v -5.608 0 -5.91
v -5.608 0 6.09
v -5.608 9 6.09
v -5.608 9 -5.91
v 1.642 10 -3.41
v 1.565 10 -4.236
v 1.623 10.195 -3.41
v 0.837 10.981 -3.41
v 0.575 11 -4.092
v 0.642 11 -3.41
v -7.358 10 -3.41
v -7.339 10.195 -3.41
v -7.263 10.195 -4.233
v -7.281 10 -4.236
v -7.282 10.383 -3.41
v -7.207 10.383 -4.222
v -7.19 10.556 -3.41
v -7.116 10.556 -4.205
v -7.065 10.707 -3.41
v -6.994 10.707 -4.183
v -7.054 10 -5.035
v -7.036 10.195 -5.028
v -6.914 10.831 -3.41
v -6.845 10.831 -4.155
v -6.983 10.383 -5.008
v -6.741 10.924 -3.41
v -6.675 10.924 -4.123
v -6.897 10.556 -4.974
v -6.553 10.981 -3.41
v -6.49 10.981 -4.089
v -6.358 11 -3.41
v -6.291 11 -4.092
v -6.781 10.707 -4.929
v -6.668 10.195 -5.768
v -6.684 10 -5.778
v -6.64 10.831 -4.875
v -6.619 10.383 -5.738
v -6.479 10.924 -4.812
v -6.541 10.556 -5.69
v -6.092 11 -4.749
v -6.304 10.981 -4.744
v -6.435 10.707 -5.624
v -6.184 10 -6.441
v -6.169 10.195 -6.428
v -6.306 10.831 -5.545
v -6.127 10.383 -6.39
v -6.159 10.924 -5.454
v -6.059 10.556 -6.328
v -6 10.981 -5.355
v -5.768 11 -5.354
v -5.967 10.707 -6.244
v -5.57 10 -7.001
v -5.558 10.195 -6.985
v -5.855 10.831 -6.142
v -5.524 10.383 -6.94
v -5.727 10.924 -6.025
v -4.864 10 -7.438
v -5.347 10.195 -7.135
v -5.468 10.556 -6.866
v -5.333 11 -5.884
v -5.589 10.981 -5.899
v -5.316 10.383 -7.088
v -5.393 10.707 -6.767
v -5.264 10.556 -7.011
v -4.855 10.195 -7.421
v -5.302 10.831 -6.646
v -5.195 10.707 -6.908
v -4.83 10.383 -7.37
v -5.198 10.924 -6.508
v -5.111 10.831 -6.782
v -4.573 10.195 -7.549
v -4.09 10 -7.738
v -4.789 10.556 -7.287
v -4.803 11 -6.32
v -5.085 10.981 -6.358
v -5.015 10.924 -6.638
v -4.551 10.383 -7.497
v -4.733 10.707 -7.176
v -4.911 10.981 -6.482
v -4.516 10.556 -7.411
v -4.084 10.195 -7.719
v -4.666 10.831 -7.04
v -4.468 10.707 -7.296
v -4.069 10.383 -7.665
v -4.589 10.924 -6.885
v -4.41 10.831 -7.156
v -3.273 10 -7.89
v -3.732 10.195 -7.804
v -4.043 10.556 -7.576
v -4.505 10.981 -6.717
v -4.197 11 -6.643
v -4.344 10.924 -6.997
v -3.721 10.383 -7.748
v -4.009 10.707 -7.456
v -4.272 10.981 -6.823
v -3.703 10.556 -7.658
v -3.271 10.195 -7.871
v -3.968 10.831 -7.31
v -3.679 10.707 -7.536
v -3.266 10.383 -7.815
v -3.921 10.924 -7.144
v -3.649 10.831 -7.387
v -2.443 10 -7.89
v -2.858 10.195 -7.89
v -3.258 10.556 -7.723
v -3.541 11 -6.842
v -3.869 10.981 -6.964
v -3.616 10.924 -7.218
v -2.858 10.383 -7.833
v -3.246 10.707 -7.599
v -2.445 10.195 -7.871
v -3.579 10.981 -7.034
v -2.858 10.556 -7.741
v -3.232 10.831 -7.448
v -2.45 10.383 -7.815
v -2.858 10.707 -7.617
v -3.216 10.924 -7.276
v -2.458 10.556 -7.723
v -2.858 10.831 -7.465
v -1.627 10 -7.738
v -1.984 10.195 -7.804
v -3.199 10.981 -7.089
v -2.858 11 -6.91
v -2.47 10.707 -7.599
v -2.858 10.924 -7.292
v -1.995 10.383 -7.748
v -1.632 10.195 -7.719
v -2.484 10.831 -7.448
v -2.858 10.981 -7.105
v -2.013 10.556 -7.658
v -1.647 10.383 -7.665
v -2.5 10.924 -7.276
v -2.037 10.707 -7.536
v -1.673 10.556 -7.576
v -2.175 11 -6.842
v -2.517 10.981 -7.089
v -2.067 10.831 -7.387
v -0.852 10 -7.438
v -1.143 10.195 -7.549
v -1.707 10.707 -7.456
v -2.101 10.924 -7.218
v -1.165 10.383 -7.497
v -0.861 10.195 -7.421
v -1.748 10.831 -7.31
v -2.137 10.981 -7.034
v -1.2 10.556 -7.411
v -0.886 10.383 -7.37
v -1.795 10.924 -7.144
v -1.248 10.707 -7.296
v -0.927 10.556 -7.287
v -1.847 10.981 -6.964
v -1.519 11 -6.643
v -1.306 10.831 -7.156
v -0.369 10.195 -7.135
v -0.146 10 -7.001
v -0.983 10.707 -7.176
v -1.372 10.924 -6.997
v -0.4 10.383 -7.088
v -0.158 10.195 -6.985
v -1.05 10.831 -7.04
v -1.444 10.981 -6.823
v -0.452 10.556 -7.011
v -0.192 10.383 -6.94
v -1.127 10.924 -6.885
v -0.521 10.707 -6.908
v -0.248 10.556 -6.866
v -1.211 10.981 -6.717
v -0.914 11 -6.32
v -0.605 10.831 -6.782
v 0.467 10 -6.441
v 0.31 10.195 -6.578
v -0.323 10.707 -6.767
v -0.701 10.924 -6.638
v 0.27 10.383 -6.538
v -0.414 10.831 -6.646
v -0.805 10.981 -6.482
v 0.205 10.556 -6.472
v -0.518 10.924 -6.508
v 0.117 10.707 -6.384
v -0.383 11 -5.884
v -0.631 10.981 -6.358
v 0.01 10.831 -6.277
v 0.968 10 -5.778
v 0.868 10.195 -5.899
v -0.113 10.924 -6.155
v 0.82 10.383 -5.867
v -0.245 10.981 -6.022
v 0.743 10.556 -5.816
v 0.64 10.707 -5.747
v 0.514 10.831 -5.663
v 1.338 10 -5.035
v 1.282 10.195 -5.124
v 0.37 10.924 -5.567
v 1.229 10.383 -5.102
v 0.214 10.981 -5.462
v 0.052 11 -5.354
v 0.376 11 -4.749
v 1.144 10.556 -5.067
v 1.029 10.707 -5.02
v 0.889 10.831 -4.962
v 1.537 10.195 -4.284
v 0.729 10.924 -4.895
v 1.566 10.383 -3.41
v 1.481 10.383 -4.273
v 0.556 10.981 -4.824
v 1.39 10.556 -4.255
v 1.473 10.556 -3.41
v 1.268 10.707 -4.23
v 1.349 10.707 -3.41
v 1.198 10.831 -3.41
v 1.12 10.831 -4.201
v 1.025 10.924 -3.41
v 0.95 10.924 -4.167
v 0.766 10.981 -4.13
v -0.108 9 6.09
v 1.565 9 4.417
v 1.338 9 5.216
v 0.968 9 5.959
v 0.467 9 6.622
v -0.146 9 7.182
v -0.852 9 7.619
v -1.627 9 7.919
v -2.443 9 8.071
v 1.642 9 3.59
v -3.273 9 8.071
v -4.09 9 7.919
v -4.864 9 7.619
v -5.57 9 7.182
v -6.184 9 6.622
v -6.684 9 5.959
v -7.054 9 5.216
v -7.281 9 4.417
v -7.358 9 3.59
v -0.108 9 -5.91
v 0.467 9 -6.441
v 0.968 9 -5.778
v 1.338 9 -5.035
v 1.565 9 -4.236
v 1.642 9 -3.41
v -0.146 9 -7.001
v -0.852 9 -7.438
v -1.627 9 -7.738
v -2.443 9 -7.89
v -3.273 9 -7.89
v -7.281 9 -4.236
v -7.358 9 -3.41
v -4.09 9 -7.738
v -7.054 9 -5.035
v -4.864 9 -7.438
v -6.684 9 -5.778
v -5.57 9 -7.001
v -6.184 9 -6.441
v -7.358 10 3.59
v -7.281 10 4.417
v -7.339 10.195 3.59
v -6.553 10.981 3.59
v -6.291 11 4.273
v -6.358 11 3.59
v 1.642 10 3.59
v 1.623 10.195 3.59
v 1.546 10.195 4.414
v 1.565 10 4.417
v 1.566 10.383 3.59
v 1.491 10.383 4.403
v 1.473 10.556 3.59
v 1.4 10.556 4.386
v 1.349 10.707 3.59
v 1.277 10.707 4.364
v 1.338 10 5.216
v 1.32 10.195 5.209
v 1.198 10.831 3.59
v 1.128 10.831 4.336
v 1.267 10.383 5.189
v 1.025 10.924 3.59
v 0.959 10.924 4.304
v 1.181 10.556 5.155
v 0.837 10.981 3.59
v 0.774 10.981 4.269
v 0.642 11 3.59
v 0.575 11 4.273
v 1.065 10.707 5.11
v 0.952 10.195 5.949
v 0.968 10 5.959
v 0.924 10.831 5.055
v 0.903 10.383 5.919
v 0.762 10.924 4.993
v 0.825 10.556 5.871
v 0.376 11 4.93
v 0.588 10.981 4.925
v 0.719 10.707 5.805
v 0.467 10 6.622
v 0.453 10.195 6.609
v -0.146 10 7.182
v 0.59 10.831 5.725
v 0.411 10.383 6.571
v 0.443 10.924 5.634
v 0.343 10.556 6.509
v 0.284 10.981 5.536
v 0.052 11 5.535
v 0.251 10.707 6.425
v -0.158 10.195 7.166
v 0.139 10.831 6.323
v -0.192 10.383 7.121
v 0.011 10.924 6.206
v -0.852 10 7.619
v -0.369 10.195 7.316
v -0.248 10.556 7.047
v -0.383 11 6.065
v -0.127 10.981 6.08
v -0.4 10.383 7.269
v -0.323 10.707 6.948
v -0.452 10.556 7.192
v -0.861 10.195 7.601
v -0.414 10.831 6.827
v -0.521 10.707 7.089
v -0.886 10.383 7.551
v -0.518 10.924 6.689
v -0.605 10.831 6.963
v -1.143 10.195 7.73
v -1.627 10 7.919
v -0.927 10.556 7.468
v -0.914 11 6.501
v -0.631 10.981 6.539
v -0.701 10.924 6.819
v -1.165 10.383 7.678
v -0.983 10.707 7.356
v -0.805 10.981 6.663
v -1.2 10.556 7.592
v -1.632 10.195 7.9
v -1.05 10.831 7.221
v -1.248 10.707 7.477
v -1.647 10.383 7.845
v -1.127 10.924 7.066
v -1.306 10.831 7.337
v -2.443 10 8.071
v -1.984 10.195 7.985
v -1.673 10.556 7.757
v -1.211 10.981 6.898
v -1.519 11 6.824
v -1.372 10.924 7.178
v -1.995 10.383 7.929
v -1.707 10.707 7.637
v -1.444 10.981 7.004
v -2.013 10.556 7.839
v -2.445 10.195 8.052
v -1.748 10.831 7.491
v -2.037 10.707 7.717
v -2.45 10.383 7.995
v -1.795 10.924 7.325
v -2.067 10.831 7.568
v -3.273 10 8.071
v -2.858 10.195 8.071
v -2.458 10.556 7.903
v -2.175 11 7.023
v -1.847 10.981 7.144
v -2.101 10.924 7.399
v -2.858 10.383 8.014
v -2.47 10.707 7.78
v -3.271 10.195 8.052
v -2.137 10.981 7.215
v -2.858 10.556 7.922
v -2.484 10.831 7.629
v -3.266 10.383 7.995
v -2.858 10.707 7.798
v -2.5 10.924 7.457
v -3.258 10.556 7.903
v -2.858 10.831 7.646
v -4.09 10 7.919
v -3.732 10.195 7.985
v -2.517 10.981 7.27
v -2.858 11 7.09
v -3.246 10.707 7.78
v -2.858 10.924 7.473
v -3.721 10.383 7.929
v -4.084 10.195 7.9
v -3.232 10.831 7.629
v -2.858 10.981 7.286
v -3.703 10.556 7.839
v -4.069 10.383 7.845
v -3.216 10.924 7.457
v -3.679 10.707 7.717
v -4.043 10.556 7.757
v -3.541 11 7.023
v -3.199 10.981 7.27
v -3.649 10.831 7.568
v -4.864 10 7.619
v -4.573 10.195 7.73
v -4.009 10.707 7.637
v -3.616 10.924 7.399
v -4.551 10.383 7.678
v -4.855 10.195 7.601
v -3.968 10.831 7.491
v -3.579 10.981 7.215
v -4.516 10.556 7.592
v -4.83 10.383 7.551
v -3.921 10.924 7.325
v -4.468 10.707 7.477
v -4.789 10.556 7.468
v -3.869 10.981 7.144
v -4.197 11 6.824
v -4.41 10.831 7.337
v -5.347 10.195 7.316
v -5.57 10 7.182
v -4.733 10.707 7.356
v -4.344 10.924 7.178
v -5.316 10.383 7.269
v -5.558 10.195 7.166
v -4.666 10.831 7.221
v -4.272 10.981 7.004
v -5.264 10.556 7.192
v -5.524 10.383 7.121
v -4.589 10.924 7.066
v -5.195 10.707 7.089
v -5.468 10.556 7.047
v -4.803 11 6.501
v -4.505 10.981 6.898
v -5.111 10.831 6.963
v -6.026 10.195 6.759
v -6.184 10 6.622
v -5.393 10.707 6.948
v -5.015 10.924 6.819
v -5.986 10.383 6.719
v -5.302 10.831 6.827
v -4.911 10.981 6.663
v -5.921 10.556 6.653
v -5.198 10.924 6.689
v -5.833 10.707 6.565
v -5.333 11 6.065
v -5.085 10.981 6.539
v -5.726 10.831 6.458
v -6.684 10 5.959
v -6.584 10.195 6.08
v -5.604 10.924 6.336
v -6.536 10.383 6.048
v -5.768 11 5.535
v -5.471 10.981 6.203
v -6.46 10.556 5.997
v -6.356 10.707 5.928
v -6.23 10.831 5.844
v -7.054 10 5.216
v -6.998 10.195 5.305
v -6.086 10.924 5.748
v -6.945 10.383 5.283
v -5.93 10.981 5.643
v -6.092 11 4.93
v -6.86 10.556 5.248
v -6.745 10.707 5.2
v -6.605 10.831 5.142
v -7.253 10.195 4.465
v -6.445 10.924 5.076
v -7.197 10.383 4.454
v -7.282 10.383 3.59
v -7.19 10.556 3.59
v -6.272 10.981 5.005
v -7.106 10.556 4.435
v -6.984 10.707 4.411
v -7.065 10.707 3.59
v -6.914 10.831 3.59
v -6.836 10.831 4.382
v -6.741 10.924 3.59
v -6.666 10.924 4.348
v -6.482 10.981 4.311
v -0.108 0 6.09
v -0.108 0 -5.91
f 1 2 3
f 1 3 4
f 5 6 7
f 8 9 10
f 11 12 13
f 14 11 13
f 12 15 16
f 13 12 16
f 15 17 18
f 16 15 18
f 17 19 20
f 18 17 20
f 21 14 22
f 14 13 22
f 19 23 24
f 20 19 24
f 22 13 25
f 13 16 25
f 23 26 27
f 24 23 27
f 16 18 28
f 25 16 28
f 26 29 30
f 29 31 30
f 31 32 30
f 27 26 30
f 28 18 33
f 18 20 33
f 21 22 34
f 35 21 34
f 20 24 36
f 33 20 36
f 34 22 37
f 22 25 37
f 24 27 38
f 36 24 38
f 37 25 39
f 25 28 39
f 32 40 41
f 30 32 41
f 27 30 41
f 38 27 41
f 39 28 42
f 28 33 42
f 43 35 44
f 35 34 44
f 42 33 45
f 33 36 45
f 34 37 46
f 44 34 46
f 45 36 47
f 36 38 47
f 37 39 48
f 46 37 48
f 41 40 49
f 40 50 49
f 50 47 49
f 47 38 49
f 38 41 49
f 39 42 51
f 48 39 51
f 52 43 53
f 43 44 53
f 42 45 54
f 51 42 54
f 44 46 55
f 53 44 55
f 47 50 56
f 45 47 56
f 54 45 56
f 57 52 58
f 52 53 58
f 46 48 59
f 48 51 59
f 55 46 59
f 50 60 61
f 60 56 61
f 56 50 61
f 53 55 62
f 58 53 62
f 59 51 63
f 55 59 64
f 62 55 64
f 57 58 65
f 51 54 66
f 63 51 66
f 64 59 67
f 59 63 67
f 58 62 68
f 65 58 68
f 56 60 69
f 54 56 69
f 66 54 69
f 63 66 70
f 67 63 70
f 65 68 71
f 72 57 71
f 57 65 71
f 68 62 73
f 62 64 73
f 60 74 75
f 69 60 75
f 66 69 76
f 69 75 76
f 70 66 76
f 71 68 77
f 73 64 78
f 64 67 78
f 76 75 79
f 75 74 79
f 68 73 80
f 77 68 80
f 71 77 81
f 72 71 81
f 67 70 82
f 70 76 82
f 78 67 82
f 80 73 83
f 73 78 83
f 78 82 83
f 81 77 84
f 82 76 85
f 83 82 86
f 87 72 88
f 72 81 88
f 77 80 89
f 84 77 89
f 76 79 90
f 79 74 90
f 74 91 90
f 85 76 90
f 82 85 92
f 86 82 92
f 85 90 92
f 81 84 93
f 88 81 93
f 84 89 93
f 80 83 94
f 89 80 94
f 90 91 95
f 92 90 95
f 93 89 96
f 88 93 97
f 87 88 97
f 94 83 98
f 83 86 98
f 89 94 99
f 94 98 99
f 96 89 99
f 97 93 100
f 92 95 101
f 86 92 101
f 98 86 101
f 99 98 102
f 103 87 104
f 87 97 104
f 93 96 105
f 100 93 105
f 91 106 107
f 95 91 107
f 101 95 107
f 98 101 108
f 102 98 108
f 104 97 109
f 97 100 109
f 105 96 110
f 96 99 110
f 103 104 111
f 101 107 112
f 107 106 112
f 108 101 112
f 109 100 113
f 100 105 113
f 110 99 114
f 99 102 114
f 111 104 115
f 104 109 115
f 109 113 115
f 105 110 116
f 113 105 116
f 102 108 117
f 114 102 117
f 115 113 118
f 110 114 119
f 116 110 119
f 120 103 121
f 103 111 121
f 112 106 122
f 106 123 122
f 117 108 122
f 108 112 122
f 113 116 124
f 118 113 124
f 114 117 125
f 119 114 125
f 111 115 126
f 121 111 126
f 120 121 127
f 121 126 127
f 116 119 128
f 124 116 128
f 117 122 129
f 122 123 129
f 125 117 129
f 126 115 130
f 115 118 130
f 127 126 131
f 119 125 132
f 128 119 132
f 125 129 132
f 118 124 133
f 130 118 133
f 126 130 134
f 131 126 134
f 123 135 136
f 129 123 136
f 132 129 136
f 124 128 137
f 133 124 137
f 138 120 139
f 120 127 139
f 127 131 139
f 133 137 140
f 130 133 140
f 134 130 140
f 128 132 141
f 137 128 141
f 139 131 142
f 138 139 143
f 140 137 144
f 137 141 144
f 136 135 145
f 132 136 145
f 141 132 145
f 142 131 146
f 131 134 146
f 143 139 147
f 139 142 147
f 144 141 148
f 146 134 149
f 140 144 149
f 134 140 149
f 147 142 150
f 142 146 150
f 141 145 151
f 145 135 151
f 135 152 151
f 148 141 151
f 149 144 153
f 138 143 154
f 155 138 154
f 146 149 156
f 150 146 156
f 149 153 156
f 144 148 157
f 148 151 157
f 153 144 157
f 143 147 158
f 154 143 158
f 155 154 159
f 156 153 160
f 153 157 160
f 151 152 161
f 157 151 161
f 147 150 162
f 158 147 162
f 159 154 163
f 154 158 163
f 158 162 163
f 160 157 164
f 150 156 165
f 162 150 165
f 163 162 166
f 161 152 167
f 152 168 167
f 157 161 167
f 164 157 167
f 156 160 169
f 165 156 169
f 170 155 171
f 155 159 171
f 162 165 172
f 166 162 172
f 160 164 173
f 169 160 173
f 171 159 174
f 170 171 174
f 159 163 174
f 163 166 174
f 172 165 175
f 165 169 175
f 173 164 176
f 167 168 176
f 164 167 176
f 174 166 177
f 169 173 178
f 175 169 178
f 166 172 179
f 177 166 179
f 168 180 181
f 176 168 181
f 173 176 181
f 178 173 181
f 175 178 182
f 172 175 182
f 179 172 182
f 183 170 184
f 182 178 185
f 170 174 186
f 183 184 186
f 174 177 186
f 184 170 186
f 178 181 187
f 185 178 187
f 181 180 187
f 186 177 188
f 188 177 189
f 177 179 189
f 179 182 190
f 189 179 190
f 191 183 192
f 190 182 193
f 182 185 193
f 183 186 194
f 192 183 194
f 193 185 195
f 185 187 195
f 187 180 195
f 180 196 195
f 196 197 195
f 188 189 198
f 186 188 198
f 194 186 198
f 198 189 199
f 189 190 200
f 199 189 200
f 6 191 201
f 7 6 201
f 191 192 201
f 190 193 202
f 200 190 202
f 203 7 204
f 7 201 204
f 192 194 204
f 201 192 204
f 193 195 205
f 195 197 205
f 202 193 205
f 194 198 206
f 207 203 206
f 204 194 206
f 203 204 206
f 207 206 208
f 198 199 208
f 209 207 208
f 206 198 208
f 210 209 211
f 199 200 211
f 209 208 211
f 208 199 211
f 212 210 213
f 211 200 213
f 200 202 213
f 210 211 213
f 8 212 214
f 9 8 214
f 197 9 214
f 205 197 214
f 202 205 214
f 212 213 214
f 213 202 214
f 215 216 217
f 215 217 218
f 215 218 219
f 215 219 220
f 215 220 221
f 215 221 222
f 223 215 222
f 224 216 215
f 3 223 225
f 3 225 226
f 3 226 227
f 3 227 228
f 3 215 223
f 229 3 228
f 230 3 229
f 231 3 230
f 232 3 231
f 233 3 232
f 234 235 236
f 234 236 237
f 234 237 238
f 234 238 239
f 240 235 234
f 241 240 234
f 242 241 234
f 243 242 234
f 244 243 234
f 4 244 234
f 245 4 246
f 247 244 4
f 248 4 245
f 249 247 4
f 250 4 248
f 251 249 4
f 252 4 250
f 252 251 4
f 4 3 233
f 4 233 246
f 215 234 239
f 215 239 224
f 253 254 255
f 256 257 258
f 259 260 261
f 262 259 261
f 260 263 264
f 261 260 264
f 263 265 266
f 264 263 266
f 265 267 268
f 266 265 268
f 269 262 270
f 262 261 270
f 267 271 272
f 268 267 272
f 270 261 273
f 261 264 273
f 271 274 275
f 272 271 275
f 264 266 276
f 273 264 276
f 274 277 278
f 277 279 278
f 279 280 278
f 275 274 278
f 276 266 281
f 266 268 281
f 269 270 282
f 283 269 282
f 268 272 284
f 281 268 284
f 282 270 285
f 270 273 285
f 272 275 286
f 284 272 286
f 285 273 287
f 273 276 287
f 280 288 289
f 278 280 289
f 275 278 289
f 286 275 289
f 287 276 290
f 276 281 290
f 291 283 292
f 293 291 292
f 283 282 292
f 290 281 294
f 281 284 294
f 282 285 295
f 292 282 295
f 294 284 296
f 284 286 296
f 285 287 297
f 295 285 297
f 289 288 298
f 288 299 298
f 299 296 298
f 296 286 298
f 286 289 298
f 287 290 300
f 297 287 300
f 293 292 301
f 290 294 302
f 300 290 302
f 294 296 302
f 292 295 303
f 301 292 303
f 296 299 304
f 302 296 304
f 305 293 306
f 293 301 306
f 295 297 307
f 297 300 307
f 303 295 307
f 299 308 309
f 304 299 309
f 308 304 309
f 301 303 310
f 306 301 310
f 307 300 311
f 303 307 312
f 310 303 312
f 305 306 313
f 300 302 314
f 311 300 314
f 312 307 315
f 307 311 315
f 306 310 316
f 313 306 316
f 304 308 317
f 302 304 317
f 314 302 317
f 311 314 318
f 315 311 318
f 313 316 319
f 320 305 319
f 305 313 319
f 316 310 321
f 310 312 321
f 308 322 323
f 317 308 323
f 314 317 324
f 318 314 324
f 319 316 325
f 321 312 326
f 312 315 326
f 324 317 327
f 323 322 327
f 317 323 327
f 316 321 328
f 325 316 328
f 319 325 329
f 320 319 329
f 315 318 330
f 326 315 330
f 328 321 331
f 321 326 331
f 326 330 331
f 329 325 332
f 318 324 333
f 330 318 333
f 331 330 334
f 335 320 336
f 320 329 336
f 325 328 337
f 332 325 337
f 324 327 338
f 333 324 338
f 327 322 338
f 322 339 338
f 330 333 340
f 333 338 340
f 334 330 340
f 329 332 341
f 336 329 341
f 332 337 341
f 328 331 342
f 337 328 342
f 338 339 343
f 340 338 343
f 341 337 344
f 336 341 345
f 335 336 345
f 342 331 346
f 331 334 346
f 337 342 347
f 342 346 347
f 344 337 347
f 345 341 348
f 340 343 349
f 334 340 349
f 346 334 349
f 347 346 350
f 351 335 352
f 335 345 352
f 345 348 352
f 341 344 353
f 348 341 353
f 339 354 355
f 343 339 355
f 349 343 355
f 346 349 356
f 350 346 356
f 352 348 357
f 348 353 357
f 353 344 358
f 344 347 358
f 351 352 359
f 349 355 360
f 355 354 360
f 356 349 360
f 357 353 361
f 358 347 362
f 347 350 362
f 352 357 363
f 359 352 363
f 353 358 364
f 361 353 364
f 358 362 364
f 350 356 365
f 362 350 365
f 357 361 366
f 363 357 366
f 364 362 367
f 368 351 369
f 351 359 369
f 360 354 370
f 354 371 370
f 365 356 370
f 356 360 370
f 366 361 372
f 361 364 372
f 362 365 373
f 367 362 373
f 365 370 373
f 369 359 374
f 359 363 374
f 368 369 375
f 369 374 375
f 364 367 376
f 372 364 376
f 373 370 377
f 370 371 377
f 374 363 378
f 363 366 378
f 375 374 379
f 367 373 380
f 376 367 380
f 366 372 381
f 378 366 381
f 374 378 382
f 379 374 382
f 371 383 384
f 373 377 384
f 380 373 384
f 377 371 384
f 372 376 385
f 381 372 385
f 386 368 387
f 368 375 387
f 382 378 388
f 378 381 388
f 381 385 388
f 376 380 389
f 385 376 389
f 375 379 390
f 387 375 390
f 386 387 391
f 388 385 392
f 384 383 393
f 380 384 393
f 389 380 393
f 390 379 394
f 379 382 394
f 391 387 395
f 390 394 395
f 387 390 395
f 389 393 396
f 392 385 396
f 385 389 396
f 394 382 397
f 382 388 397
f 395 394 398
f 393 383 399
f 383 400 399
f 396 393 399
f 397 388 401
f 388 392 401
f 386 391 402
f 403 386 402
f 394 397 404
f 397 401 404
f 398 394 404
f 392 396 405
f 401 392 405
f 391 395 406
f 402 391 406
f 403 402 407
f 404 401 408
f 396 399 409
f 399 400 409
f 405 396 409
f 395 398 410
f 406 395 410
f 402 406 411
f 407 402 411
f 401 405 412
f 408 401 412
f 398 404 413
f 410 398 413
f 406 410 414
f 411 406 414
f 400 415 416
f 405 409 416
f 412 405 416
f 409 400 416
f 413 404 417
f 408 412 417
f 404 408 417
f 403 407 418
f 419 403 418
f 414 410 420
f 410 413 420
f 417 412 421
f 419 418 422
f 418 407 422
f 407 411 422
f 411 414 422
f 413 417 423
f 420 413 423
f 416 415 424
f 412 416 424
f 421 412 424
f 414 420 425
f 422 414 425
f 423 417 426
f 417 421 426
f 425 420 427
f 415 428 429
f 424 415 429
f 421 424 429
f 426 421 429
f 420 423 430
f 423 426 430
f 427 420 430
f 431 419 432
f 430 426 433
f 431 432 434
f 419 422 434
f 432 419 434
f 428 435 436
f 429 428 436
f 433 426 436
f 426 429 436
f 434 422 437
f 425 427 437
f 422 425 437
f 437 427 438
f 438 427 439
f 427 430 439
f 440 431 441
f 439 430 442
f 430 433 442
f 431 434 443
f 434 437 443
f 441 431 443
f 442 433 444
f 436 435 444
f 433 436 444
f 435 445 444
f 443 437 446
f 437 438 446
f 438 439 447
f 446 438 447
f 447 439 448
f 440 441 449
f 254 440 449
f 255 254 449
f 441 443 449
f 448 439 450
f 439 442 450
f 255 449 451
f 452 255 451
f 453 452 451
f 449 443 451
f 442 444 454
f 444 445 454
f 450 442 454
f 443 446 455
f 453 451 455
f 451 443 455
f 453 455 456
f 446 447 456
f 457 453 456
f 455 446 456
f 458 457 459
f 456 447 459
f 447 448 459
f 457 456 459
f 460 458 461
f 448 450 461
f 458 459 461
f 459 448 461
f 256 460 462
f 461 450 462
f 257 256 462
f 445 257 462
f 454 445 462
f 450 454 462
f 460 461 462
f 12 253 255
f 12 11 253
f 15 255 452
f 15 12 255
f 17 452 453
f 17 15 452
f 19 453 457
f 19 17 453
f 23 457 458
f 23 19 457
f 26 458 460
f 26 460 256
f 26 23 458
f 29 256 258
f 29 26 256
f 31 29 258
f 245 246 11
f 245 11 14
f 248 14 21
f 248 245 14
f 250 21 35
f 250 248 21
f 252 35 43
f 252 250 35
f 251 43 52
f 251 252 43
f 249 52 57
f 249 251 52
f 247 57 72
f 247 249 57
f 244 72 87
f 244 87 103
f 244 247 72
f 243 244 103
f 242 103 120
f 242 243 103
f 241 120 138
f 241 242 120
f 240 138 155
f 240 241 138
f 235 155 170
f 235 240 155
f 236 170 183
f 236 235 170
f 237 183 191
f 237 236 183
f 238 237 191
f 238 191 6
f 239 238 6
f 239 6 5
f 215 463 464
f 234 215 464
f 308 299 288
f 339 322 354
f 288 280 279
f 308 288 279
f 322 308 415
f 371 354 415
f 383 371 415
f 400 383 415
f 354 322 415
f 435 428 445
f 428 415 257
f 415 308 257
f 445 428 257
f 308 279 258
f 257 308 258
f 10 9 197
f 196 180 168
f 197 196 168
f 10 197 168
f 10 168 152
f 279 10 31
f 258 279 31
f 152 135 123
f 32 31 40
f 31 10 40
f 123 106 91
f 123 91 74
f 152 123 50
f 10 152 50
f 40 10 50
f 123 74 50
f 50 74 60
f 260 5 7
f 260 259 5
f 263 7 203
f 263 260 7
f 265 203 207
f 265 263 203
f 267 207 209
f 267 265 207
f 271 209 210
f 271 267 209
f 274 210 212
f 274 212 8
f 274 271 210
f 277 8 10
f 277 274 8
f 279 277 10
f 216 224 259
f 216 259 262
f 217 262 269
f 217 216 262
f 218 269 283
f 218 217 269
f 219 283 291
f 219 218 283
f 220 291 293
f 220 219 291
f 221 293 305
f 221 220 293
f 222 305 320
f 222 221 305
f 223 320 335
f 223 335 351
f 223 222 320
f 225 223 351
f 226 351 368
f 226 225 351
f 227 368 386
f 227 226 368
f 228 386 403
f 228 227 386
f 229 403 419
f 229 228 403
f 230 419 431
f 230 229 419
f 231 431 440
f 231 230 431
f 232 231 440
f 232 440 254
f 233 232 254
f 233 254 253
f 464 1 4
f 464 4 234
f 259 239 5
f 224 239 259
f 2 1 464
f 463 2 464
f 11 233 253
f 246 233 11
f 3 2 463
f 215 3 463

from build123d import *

# Parameters (mm, degrees)
SKETCH_1_W      = 5.5
SKETCH_1_H      = 12
EXTRUDE_1_DEPTH = 9
EXTRUDE_2_DEPTH = 2
FILLET_1_R      = 1


with BuildPart() as part:
    # Эскиз1 → Бобышка-Вытянуть1 (new body)
    with BuildSketch(Plane(origin=(0, 0, 0), x_dir=(1, 0, 0), z_dir=(0, 1, 0))):
        with Locations((-2.858040201, -0.090452261)):
            Rectangle(SKETCH_1_W, SKETCH_1_H)
    extrude(amount=EXTRUDE_1_DEPTH)

    # Эскиз3 → Бобышка-Вытянуть2 (add)
    with BuildSketch(Plane(origin=(0, 9, 0), x_dir=(1, 0, 0), z_dir=(0, 1, 0))):
        with BuildLine():
            Line((1.641959799, 3.409547739), (1.641959799, -3.590452261))
            ThreePointArc((1.641959799, -3.590452261), (-2.858040201, -8.090452261), (-7.358040201, -3.590452261))
            Line((-7.358040201, -3.590452261), (-7.358040201, 3.409547739))
            ThreePointArc((-7.358040201, 3.409547739), (-2.858040201, 7.909547739), (1.641959799, 3.409547739))
        make_face()
    extrude(amount=EXTRUDE_2_DEPTH)

    # Скругление1
    fillet_1_edges = [part.edges().sort_by_distance(p)[0] for p in [
        (-2.858040201, 11, -7.909547739),
        (-7.358040201, 11, 0.090452261),
        (-2.858040201, 11, 8.090452261),
        (1.641959799, 11, 0.090452261),
    ]]
    fillet(fillet_1_edges, radius=FILLET_1_R)


solid = part.part
